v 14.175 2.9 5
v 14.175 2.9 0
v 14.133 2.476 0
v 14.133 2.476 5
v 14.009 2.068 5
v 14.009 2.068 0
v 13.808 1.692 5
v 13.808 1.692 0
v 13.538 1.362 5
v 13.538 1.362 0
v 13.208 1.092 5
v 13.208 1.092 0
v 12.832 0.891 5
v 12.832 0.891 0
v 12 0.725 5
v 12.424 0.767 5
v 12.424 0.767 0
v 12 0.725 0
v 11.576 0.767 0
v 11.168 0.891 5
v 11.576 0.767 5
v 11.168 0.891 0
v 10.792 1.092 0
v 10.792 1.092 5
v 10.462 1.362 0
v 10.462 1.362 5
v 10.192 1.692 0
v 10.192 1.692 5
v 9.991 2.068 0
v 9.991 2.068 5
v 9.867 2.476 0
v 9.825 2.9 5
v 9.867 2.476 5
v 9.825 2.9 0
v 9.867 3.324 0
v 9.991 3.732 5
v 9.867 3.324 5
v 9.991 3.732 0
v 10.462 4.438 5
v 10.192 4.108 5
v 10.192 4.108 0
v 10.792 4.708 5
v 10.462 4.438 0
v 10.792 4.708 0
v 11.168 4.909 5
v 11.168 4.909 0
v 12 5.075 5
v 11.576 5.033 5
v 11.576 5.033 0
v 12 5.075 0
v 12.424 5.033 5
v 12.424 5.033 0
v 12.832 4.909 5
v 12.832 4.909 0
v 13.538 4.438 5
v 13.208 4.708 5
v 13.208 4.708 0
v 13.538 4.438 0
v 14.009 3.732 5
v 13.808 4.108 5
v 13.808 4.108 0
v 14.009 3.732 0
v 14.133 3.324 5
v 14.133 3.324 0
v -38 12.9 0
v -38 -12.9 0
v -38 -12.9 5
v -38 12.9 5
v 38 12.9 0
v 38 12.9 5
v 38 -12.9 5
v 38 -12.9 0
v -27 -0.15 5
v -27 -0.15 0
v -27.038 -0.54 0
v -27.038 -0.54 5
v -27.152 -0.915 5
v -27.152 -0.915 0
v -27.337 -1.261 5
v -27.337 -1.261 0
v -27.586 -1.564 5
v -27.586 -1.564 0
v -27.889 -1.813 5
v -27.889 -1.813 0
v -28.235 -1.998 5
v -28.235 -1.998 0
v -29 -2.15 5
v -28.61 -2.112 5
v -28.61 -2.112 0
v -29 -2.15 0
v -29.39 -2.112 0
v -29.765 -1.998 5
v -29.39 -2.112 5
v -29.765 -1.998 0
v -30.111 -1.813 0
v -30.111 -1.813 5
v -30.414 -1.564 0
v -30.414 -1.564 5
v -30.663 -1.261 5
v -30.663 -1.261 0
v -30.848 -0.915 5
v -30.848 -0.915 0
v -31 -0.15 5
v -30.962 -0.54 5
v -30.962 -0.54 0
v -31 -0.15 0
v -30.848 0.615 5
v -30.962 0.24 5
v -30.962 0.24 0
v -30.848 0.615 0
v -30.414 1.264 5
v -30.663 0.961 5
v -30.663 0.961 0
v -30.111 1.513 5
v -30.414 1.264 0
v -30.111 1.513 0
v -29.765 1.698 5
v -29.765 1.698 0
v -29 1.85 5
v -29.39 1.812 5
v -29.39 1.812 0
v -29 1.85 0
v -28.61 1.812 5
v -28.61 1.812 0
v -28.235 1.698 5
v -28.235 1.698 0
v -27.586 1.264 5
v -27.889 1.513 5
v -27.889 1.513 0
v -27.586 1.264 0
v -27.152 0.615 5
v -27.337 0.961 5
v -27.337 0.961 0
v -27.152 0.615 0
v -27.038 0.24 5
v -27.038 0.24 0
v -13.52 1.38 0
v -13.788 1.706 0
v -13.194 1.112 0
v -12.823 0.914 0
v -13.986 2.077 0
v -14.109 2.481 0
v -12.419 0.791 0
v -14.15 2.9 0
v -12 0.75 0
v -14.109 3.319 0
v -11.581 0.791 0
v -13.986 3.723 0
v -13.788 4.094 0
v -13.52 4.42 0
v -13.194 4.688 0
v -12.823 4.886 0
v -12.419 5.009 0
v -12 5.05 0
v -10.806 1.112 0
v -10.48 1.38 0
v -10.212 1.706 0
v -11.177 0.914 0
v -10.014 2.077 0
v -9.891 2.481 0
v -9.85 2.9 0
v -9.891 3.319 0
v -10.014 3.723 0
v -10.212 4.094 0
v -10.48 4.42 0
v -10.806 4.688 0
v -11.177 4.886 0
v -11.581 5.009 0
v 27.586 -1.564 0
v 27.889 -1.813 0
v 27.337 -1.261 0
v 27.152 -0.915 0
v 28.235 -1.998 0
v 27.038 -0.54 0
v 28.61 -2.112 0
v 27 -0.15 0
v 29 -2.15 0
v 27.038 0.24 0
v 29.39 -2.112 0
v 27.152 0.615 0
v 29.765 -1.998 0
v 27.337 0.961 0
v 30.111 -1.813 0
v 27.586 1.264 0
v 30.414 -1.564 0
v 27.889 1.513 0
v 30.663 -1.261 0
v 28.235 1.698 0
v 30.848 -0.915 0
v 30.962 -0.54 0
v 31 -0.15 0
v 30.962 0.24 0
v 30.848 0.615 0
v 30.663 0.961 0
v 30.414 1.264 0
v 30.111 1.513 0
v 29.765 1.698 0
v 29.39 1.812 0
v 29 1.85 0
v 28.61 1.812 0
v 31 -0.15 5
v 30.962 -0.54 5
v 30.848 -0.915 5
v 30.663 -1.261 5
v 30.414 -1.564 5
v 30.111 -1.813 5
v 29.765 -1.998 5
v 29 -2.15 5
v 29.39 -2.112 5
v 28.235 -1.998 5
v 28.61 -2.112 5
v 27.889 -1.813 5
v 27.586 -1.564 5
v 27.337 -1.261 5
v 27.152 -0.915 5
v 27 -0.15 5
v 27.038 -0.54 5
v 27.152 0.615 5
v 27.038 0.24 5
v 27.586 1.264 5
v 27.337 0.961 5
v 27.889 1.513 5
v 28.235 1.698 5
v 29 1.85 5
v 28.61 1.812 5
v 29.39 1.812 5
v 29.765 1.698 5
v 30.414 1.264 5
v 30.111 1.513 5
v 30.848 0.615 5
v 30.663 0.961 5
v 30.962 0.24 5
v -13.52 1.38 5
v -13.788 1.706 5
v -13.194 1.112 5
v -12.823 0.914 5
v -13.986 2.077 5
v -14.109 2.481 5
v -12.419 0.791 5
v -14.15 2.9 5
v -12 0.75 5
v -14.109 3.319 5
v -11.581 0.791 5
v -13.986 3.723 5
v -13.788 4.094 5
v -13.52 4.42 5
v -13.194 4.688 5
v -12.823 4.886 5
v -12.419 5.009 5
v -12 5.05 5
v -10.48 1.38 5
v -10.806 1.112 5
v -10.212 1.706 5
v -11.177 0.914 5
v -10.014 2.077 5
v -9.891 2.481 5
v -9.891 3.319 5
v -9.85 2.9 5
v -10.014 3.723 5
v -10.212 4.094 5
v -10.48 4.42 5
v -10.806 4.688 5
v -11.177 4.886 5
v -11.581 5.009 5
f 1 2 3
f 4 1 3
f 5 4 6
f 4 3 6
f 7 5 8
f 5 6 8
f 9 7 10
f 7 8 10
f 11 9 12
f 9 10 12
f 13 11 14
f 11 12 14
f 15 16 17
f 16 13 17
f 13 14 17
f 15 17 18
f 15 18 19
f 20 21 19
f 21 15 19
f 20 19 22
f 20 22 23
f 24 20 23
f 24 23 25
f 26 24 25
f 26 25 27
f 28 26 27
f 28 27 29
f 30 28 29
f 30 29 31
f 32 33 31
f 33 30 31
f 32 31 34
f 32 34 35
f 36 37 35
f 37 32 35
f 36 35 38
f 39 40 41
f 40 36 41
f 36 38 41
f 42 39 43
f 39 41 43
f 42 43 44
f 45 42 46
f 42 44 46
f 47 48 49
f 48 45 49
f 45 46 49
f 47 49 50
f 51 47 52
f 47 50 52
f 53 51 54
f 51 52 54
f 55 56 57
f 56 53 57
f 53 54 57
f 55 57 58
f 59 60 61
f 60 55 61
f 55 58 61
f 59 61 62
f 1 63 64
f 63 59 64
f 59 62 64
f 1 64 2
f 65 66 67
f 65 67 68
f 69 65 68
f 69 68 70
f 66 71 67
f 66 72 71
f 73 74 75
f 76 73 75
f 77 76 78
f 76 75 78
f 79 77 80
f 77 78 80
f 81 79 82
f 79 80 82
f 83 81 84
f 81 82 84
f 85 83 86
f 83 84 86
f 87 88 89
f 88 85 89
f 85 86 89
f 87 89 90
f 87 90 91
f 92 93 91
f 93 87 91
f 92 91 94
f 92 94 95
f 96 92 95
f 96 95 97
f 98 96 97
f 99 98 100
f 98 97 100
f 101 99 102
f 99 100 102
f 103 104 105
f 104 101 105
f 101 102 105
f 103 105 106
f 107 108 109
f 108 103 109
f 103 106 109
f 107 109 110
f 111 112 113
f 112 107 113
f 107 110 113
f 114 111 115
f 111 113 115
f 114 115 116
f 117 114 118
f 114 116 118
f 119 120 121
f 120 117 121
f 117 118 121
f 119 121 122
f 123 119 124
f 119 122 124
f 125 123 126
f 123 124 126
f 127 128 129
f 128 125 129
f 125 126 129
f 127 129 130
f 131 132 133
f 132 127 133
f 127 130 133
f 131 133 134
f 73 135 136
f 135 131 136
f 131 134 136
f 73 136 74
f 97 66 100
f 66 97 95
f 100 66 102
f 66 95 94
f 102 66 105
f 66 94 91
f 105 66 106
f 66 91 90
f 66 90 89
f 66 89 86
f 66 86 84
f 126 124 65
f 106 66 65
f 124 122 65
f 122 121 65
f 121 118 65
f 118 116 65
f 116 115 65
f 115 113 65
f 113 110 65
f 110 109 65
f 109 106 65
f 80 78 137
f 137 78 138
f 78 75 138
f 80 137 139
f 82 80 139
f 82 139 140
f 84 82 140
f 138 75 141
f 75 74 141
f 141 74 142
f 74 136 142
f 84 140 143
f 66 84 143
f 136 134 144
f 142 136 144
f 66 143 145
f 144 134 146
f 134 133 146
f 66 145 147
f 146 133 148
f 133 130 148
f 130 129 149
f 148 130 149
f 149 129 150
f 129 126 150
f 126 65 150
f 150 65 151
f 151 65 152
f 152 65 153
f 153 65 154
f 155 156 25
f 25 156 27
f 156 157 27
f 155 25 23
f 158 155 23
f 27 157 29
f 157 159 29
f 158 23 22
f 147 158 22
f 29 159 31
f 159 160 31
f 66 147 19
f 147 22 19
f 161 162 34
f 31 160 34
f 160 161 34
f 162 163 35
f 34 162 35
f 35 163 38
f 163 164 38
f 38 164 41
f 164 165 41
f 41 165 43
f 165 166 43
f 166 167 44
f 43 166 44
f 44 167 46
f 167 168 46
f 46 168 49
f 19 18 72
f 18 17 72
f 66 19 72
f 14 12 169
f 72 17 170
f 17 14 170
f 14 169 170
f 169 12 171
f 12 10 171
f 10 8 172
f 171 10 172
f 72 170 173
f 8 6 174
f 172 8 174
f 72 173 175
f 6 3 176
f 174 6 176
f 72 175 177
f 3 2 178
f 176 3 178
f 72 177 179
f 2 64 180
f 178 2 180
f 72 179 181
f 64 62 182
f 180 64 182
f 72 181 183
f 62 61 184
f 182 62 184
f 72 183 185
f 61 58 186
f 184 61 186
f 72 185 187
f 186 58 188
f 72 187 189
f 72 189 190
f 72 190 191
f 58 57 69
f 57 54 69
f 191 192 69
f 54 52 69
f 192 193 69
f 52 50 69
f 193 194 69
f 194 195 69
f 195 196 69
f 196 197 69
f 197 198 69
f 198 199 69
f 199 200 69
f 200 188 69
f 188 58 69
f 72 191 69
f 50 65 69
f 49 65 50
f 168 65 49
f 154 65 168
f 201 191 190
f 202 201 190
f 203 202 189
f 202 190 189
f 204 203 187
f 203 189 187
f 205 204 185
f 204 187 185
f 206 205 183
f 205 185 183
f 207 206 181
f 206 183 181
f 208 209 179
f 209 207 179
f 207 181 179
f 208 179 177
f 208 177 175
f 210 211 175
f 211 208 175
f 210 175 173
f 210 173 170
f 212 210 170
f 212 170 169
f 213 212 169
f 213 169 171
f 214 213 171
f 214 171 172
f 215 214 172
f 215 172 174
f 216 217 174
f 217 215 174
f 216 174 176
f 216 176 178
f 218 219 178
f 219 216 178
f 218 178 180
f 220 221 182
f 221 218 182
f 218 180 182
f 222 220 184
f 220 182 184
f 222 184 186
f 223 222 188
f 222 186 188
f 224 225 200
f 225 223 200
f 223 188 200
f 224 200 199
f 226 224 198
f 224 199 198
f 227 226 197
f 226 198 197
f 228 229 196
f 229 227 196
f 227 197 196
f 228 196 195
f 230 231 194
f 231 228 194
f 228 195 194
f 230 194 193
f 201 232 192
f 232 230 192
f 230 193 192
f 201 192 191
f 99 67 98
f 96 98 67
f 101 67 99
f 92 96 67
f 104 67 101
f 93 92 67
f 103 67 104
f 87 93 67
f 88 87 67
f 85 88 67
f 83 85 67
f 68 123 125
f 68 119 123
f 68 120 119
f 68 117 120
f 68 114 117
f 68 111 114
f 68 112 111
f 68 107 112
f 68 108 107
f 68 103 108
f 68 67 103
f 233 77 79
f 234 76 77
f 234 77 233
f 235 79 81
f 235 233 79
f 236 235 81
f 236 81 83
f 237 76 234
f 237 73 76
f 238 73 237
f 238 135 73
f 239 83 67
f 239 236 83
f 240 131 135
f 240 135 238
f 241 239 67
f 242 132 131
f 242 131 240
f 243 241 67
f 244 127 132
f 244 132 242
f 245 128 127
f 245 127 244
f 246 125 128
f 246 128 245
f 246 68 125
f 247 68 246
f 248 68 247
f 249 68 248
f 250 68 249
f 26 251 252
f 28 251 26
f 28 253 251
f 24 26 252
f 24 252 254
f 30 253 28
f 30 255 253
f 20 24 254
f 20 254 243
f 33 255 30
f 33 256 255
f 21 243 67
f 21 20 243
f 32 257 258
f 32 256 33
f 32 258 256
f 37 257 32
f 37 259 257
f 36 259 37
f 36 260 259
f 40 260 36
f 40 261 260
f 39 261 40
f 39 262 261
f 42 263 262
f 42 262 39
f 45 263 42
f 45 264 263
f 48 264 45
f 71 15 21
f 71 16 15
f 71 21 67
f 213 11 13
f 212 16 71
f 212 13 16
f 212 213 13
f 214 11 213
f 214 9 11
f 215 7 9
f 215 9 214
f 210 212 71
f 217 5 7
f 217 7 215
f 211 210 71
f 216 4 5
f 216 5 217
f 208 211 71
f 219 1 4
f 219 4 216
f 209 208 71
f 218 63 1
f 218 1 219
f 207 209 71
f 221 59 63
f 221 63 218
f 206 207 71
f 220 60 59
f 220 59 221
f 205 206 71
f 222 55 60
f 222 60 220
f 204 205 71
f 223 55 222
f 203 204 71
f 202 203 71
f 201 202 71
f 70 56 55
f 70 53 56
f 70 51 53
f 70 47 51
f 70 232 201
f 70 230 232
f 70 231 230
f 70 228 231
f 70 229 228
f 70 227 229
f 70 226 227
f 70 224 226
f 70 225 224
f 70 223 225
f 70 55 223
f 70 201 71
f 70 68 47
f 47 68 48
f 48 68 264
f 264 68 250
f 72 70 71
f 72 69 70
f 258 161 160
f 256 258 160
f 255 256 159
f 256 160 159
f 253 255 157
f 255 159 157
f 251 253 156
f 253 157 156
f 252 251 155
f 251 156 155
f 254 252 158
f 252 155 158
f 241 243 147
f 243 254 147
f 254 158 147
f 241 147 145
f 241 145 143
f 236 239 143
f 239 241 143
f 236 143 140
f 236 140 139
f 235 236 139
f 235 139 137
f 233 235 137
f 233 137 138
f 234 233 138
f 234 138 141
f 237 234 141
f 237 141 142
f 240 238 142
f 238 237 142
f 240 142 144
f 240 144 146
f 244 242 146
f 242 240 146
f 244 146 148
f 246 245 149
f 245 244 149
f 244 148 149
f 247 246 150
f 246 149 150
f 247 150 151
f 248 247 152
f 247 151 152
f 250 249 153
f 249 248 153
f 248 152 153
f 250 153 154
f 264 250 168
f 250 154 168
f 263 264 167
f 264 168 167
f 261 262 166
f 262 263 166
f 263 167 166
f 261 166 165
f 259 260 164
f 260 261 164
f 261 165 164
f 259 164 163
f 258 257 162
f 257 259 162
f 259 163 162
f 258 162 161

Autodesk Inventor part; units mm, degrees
ref_plane "YZ Plane" through (0, 0, 0) normal (1, 0, 0) x (0, 1, 0)
ref_plane "XZ Plane" through (0, 0, 0) normal (0, 1, 0) x (-1, 0, 0)
ref_plane "XY Plane" through (0, 0, 0) normal (0, 0, 1) x (1, 0, 0)
ref_plane "Arbeitsebene1" through (0, 0, 0) normal (0, 0, 1) x (1, 0, 0)
sketch "Skizze1" plane through (0, 0, 0) normal (0, 0, 1) x (1, 0, 0)
  circle A0 centre (-12, 2.9) radius 1.5 projected
  circle A1 centre (12, 2.9) radius 1.5 projected
  line L0 (-38, 12.9) -> (38, 12.9) projected
  line L1 (-38, -12.9) -> (-38, 12.9) projected
  line L2 (38, -12.9) -> (-38, -12.9) projected
  line L3 (38, 12.9) -> (38, -12.9) projected
  circle A2 centre (12, 2.9) radius 2.175
  circle A3 centre (-12, 2.9) radius 2.15
  circle A4 centre (-12, 2.9) radius 1.5 projected
  circle A5 centre (12, 2.9) radius 1.5 projected
  line L4 (-38, 12.9) -> (38, 12.9) projected
  line L5 (-38, -12.9) -> (-38, 12.9) projected
  line L6 (38, -12.9) -> (-38, -12.9) projected
  line L7 (38, 12.9) -> (38, -12.9) projected
  circle A6 centre (29, -0.15) radius 1.6 projected
  circle A7 centre (-29, -0.15) radius 1.6 projected
  circle A8 centre (29, -0.15) radius 2
  circle A9 centre (-29, -0.15) radius 2
  point P0 (0, 0)
  dimension "d0" = 4.35
  dimension "d1" = 4.3
  dimension "d2" = 4
  dimension "d3" = 4
extrude "Extrusion1" add sketch "Skizze1" along normal blind 5 contours L0 L3 L2 L1
properties part number "00_Sandwich_base"
